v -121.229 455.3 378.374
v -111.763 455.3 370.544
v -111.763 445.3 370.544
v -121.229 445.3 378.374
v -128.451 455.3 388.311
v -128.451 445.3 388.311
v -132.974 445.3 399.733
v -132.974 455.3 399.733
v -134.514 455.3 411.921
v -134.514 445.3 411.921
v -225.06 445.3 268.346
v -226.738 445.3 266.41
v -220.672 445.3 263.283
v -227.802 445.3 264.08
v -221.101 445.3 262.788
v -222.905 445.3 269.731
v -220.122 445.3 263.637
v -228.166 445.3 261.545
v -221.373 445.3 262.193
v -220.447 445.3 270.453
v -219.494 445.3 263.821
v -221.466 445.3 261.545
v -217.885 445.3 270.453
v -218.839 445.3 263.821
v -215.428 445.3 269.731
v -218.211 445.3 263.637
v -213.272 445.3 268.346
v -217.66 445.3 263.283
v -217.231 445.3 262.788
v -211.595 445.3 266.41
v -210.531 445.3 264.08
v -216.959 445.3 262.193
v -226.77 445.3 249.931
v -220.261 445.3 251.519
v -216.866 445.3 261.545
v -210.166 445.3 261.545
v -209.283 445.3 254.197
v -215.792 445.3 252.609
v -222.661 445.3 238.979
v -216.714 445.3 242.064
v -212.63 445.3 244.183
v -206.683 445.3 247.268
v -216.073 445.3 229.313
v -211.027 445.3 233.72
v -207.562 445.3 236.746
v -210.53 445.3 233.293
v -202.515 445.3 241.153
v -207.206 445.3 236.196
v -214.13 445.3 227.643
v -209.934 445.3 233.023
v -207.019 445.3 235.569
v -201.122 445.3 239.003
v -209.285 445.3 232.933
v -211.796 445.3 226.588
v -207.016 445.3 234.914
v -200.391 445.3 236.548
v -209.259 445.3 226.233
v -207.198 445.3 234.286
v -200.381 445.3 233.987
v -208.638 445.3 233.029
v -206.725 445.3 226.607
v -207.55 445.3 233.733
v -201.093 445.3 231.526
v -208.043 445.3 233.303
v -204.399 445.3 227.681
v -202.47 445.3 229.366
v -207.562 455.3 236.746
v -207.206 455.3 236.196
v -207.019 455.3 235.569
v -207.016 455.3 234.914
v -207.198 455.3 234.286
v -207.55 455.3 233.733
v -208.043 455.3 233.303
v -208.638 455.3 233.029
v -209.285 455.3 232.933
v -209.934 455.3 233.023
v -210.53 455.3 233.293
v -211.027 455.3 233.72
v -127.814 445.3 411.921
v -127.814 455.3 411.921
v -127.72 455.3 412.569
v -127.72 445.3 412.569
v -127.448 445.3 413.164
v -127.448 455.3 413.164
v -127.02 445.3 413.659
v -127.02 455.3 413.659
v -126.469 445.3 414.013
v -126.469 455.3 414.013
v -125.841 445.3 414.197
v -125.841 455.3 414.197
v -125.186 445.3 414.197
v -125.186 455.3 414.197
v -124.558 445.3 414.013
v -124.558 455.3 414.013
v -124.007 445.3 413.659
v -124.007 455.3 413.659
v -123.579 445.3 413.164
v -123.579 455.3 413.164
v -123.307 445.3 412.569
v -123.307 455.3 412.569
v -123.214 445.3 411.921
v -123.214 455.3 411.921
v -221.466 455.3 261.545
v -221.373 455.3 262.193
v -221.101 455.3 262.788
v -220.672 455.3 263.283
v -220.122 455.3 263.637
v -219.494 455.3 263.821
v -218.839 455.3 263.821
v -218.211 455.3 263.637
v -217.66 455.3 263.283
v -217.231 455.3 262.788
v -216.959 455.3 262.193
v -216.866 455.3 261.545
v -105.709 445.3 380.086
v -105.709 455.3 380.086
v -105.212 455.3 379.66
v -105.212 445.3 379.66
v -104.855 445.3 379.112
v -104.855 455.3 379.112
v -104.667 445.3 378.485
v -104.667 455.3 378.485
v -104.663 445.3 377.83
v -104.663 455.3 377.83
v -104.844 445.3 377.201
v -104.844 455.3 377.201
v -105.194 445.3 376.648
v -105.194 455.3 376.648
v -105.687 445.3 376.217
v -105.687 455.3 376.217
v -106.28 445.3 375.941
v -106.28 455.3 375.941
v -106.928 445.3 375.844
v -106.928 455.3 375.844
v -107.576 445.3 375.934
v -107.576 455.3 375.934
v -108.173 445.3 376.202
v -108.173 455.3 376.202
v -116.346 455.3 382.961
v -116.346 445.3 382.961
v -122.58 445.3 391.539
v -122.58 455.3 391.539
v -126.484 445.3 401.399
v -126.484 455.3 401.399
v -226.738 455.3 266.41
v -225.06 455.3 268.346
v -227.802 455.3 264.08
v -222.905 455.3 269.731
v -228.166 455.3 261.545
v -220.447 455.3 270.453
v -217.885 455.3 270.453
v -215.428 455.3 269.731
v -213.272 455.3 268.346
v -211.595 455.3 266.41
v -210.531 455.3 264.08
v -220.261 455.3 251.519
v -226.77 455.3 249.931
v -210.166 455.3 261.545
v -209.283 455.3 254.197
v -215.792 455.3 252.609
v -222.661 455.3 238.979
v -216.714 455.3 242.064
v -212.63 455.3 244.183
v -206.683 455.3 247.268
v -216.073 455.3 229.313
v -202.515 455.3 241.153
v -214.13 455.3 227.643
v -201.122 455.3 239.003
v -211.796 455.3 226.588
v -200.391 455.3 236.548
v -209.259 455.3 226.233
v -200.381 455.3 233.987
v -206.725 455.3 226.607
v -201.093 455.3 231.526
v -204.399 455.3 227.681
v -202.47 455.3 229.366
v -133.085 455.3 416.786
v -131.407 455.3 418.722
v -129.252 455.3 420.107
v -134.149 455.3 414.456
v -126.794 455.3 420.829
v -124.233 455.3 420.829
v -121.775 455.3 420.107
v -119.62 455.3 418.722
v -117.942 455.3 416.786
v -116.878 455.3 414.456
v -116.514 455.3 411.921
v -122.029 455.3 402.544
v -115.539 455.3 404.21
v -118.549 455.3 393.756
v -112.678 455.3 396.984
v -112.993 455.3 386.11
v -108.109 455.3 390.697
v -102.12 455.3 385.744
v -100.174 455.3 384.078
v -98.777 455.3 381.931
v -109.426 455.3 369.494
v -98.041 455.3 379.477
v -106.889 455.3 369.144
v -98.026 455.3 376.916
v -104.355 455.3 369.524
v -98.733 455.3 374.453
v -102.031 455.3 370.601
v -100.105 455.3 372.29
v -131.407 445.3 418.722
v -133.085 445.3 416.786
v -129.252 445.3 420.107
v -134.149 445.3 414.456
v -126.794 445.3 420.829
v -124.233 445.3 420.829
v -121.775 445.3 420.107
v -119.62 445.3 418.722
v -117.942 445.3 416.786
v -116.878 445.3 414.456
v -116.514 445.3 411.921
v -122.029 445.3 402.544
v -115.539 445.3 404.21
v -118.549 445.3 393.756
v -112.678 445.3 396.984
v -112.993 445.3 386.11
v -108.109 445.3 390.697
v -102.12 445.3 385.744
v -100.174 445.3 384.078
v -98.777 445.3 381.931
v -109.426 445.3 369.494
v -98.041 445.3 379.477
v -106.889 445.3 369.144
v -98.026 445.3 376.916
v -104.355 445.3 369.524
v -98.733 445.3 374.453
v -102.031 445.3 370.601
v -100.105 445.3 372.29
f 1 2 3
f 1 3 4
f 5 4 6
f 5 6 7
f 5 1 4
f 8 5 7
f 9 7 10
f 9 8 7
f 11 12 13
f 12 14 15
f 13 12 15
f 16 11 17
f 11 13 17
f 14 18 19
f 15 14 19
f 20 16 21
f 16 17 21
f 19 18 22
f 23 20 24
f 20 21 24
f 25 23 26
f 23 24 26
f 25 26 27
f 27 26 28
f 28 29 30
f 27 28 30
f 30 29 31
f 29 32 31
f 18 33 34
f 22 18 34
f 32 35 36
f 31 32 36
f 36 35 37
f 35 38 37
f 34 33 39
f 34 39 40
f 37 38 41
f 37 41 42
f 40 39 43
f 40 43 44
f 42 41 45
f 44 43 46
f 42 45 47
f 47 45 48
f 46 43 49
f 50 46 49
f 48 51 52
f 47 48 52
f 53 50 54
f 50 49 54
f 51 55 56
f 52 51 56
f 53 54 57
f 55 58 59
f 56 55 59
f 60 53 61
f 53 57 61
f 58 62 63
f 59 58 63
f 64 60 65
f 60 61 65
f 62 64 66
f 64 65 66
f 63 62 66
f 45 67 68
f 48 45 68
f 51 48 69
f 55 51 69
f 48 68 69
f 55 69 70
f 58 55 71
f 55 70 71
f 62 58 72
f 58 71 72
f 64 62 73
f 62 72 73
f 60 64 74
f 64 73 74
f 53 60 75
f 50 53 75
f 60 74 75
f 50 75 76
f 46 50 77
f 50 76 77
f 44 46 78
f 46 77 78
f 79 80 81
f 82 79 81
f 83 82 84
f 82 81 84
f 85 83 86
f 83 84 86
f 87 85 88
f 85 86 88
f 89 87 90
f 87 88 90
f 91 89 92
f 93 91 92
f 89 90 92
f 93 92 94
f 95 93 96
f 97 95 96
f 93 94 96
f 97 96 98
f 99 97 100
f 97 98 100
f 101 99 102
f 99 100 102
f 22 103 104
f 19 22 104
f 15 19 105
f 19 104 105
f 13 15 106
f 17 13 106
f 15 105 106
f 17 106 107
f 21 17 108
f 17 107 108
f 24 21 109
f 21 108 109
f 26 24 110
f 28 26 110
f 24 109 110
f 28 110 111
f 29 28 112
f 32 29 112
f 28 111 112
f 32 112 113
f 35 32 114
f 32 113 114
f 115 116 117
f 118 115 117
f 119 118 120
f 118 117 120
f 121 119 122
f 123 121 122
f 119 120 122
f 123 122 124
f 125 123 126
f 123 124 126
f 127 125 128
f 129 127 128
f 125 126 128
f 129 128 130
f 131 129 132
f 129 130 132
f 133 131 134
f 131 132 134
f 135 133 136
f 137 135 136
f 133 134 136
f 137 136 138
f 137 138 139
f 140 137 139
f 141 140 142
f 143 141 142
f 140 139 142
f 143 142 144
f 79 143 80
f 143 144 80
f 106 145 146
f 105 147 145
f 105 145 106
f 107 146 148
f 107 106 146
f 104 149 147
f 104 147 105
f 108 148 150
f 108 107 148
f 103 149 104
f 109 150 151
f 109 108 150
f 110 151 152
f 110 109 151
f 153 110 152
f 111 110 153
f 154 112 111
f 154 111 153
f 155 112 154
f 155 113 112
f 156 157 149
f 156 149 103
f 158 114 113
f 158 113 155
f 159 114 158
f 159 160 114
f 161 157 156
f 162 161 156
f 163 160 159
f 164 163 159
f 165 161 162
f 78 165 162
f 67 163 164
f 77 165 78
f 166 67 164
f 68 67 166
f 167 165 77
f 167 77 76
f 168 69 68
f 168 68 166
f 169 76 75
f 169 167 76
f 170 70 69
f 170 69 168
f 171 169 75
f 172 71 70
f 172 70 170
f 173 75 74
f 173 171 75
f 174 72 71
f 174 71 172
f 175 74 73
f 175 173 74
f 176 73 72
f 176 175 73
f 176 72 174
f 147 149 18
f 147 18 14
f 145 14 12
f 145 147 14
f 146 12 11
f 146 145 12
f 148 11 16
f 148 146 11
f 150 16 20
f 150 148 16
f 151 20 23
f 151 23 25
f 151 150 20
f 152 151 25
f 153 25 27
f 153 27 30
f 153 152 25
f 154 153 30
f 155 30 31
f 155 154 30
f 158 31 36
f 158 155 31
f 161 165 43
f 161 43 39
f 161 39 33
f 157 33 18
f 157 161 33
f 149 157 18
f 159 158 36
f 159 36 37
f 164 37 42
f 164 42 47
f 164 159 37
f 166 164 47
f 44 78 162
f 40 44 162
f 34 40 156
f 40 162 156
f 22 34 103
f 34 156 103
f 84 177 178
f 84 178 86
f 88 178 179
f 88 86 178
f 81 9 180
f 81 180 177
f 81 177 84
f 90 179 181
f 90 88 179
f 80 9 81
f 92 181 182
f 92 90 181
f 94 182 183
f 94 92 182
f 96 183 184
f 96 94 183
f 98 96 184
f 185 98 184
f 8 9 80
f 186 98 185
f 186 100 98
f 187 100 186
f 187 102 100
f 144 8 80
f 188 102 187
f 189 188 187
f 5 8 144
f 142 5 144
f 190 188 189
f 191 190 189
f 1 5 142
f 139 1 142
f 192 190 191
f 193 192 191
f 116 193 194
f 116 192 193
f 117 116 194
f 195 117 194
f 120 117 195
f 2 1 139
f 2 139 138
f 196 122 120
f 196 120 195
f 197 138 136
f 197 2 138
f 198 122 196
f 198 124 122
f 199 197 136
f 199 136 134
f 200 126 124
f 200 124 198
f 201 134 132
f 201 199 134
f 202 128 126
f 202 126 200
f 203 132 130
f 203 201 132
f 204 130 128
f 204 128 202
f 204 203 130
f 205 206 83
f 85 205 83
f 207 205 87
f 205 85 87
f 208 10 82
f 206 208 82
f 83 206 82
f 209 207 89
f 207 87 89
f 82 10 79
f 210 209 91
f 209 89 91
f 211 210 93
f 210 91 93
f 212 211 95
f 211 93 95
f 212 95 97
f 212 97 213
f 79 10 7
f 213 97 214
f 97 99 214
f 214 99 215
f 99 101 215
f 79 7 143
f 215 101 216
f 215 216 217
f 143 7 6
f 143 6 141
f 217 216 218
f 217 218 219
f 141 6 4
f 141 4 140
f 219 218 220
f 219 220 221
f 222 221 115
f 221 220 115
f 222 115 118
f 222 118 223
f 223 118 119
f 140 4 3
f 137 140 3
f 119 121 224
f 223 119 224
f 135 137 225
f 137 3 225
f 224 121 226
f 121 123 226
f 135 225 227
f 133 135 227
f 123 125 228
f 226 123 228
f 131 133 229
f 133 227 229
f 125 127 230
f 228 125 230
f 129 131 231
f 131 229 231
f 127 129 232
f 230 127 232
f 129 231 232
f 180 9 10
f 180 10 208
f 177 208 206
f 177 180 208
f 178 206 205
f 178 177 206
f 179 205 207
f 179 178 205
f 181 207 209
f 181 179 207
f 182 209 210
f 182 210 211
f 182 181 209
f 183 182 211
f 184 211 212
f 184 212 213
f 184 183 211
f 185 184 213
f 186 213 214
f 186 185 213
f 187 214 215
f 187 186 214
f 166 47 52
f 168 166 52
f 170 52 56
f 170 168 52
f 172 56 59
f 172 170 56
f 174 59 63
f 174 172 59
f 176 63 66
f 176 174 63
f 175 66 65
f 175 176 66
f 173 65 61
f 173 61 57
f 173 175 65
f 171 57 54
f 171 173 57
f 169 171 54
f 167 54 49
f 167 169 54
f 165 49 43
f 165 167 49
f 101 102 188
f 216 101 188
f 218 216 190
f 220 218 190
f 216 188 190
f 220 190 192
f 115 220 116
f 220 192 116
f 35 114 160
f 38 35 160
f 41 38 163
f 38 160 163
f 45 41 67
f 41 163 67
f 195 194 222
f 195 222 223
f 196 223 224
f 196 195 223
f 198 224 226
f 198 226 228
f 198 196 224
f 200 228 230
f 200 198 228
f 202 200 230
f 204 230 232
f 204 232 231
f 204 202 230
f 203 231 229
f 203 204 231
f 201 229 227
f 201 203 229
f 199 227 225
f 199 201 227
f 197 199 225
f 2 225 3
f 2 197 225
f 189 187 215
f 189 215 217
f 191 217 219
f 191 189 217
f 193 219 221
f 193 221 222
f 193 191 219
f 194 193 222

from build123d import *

# Parameters (mm, degrees)
DODANIE_WYCI_GNI_CIE1_DEPTH   = 10
DODANIE_WYCI_GNI_CIE1_2_DEPTH = 10


with BuildPart() as part:
    # Szkic1 → Dodanie-wyciągnięcie1 (new body)
    with BuildSketch(Plane(origin=(0, 455.3, 0), x_dir=(1, 0, 0), z_dir=(0, 1, 0))):
        with BuildLine():
            ThreePointArc((-111.762653418, -370.544409902), (-128.45073709, -388.311287346), (-134.513533731, -411.920534849))
            ThreePointArc((-134.513533731, -411.920534849), (-125.513533731, -420.920534849), (-116.513533731, -411.920534849))
            ThreePointArc((-116.513533731, -411.920534849), (-112.677886877, -396.984072143), (-102.120119655, -385.743802739))
            ThreePointArc((-102.120119655, -385.743802739), (-99.341690118, -373.322839439), (-111.762653418, -370.544409902))
        make_face()
        with BuildLine():
            ThreePointArc((-105.709285, -380.086250961), (-104.999241896, -376.912004784), (-108.173488073, -376.20196168))
            ThreePointArc((-108.173488073, -376.20196168), (-122.579731733, -391.539490576), (-127.813533731, -411.920534849))
            ThreePointArc((-127.813533731, -411.920534849), (-125.513533731, -414.220534849), (-123.213533731, -411.920534849))
            ThreePointArc((-123.213533731, -411.920534849), (-118.548892234, -393.755868913), (-105.709285, -380.086250961))
        make_face(mode=Mode.SUBTRACT)
    extrude(amount=-DODANIE_WYCI_GNI_CIE1_DEPTH)


with BuildPart() as body_2:
    # Szkic1 → Dodanie-wyci_gni_cie1 2 (new body)
    with BuildSketch(Plane(origin=(0, 455.3, 0), x_dir=(1, 0, 0), z_dir=(0, 1, 0))):
        with BuildLine():
            ThreePointArc((-228.166238959, -261.544556892), (-219.166238959, -270.544556892), (-210.166238959, -261.544556892))
            ThreePointArc((-210.166238959, -261.544556892), (-208.190571246, -250.654738927), (-202.51539152, -241.152963656))
            ThreePointArc((-202.51539152, -241.152963656), (-203.374037775, -228.454037457), (-216.072963974, -229.312683713))
            ThreePointArc((-216.072963974, -229.312683713), (-225.043409348, -244.331618818), (-228.166238959, -261.544556892))
        make_face()
        with BuildLine():
            ThreePointArc((-207.561821267, -236.745748344), (-207.781253087, -233.500467204), (-211.026534227, -233.719899025))
            ThreePointArc((-211.026534227, -233.719899025), (-218.770408499, -246.685224637), (-221.466238959, -261.544556892))
            ThreePointArc((-221.466238959, -261.544556892), (-219.166238959, -263.844556892), (-216.866238959, -261.544556892))
            ThreePointArc((-216.866238959, -261.544556892), (-214.463572095, -248.301133109), (-207.561821267, -236.745748344))
        make_face(mode=Mode.SUBTRACT)
    extrude(amount=-DODANIE_WYCI_GNI_CIE1_2_DEPTH)


solid = Compound([part.part, body_2.part])
